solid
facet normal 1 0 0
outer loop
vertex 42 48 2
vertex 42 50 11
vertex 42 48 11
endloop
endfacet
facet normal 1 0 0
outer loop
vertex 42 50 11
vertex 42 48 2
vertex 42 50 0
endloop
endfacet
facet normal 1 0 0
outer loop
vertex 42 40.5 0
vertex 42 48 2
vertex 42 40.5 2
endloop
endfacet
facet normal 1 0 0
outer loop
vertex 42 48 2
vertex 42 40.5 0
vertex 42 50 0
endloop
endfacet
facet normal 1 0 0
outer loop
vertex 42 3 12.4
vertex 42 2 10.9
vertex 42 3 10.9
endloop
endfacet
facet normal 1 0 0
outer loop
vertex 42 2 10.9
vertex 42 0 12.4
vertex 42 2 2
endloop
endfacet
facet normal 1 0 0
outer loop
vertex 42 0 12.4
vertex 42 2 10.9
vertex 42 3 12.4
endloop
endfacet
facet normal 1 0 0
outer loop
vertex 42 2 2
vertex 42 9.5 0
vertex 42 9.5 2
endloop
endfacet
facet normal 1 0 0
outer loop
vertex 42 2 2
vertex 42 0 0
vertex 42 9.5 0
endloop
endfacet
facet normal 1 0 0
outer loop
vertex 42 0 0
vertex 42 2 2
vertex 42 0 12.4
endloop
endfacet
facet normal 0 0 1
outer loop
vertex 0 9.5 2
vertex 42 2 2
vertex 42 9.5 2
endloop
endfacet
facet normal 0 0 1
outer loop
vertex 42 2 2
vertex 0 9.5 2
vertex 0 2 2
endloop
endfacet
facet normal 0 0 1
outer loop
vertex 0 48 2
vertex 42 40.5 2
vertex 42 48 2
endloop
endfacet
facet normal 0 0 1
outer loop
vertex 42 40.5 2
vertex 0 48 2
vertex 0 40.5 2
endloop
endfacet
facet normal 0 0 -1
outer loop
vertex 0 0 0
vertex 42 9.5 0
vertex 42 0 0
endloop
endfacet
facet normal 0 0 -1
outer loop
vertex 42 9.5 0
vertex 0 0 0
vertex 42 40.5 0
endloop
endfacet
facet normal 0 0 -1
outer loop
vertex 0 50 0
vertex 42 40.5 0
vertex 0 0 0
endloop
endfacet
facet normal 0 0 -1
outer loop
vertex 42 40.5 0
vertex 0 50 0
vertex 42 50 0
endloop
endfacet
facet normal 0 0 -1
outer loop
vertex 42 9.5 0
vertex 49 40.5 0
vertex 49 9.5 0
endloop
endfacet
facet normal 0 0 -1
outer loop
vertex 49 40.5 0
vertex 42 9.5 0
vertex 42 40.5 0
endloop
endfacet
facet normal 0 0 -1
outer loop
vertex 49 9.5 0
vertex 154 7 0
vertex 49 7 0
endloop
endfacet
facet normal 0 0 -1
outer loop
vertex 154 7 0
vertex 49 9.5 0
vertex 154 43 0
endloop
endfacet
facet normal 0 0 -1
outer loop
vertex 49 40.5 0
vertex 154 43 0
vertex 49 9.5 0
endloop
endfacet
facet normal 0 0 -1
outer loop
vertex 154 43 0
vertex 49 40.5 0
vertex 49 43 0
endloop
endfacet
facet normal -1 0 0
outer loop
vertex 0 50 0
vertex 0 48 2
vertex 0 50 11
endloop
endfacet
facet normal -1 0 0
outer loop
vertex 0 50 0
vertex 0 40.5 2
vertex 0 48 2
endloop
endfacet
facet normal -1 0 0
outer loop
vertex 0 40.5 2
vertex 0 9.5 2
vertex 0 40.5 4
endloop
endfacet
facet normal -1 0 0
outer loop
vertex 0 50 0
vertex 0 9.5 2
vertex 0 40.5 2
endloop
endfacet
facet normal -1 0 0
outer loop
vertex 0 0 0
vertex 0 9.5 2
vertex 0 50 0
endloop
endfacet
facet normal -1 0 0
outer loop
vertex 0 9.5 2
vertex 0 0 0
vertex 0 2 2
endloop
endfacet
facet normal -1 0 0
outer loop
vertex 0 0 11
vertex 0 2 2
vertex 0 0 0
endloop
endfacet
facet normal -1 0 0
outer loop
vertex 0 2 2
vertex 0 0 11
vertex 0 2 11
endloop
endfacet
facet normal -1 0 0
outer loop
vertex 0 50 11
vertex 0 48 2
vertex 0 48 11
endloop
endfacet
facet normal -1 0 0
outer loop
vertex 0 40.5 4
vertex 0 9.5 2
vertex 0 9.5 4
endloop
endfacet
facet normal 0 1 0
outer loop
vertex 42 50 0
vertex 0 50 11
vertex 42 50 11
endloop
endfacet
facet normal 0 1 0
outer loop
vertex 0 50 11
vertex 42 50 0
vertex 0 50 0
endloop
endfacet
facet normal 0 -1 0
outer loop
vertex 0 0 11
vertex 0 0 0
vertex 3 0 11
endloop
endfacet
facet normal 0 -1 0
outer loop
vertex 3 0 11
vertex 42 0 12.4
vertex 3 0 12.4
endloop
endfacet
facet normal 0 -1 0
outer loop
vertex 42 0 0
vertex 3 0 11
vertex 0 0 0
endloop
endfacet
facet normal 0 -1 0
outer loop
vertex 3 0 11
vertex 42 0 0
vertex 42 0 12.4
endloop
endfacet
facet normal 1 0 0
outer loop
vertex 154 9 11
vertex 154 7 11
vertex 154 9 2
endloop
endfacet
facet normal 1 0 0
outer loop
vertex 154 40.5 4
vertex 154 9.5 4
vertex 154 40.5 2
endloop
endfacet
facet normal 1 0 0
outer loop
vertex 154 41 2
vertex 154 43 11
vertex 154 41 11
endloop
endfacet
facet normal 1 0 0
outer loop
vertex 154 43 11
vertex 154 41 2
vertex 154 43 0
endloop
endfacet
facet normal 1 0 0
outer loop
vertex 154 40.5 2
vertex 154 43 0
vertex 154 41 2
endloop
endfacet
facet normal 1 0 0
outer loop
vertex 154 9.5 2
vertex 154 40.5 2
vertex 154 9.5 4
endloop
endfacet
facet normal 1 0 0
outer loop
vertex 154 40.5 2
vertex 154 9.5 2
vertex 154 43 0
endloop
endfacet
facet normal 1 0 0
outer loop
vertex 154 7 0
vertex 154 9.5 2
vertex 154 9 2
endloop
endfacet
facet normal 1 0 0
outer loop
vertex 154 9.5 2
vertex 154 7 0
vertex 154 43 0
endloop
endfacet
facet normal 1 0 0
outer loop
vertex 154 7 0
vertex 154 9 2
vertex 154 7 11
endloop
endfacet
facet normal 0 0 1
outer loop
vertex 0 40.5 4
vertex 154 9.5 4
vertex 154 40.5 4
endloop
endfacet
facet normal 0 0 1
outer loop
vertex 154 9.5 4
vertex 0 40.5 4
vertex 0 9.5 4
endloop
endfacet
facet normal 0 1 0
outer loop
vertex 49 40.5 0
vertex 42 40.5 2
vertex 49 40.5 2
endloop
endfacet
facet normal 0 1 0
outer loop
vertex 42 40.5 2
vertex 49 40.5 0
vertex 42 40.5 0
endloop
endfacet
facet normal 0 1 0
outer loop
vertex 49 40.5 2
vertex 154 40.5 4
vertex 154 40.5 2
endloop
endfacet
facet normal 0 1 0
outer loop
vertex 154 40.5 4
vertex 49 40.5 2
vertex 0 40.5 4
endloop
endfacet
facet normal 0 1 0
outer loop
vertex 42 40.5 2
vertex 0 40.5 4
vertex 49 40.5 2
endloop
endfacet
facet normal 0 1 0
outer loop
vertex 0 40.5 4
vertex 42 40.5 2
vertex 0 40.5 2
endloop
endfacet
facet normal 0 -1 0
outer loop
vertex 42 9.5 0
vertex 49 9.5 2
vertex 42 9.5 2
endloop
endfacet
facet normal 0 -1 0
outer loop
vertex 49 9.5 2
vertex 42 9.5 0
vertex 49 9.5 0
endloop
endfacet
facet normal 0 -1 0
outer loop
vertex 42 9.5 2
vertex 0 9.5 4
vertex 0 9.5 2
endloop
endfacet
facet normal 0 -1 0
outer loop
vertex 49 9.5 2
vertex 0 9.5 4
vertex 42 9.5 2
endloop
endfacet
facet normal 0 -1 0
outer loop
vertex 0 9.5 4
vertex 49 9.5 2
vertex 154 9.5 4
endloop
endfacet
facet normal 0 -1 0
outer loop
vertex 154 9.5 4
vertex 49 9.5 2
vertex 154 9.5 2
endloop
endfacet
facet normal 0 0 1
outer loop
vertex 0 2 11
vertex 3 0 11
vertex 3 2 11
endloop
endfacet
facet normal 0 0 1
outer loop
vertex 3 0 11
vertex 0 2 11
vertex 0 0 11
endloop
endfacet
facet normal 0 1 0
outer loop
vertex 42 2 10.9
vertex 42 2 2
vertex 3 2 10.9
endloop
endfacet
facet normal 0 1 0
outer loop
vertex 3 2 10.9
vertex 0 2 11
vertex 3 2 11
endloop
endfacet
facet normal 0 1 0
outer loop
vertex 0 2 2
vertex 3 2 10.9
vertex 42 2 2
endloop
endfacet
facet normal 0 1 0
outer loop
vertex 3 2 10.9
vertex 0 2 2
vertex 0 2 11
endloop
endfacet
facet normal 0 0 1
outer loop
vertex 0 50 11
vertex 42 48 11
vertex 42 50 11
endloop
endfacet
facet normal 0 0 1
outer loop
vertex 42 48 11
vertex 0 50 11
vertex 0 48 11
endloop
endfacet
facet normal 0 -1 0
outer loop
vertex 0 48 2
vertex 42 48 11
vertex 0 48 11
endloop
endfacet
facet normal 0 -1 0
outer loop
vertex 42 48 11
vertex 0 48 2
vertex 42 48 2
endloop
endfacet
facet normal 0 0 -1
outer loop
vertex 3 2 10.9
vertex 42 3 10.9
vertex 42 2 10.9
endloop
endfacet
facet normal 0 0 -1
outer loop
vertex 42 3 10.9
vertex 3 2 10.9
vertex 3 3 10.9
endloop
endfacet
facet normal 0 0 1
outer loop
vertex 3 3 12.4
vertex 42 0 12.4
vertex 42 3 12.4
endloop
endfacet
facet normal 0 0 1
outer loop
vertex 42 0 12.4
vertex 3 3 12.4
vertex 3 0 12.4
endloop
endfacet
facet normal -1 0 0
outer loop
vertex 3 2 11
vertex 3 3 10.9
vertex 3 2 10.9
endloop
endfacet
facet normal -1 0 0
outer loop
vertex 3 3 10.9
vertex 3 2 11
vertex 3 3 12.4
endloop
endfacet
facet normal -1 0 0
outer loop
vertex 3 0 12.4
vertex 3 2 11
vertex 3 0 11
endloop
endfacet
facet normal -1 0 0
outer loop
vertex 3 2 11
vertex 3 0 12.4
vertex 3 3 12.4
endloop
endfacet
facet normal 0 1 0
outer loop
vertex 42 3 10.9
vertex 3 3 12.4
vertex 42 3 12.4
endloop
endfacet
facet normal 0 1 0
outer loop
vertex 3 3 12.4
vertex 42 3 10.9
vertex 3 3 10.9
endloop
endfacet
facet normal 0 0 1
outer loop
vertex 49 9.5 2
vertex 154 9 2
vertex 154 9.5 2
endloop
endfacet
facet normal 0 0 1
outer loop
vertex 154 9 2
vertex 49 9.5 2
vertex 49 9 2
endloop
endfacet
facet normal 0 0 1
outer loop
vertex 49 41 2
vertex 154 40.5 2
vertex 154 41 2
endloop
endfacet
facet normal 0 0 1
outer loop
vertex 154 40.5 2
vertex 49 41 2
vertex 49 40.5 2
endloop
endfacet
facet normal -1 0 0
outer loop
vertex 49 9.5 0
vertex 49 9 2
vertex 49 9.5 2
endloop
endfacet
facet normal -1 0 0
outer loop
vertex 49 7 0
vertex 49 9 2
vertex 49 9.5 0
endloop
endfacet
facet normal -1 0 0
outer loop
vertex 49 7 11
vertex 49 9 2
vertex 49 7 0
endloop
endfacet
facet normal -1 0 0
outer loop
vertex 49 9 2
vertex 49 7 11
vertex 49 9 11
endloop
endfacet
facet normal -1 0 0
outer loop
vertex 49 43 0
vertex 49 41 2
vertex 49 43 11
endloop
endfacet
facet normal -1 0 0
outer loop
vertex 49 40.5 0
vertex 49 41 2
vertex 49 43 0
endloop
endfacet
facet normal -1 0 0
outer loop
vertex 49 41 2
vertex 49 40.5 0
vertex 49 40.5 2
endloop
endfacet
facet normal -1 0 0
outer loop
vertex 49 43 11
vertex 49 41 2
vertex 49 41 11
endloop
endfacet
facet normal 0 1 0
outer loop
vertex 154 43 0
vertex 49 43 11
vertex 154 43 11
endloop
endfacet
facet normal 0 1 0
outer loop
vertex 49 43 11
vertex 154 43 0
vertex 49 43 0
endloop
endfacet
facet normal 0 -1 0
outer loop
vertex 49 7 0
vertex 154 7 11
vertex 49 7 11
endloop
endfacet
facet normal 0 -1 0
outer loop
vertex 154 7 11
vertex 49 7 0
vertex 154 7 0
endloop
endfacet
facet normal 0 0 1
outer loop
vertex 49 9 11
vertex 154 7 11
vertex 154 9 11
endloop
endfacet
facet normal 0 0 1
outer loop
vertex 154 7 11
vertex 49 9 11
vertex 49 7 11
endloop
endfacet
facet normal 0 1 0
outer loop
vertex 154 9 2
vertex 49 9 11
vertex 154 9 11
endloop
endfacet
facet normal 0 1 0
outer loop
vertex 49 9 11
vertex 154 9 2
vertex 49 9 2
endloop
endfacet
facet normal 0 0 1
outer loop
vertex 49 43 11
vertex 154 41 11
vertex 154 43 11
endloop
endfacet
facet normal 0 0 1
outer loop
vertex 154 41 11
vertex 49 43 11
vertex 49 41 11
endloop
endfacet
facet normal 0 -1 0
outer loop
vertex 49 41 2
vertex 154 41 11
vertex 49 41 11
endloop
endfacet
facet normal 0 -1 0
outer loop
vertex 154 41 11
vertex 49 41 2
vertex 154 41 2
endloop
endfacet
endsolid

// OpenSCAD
union() {
    translate([0, 0, 0]) cube([42, 50, 2]);
    translate([0, 9.5, 0]) cube([154, 31, 4]);
    translate([0, 0, 0]) cube([42, 2, 11]);
    translate([0, 48, 0]) cube([42, 2, 11]);
    color("Green") translate([0, 0, 10.9]) 
    linear_extrude(height=1.5) polygon(points=[[3, 3], [3, 0], [42, 0], [42, 3]]);

    translate([49, 7, 0]) cube([105, 36, 2]);
    translate([49, 9.5, 0]) cube([105, 31, 4]);
    translate([49, 7, 0]) cube([105, 2, 11]);
    translate([49, 41, 0]) cube([105, 2, 11]);
}
